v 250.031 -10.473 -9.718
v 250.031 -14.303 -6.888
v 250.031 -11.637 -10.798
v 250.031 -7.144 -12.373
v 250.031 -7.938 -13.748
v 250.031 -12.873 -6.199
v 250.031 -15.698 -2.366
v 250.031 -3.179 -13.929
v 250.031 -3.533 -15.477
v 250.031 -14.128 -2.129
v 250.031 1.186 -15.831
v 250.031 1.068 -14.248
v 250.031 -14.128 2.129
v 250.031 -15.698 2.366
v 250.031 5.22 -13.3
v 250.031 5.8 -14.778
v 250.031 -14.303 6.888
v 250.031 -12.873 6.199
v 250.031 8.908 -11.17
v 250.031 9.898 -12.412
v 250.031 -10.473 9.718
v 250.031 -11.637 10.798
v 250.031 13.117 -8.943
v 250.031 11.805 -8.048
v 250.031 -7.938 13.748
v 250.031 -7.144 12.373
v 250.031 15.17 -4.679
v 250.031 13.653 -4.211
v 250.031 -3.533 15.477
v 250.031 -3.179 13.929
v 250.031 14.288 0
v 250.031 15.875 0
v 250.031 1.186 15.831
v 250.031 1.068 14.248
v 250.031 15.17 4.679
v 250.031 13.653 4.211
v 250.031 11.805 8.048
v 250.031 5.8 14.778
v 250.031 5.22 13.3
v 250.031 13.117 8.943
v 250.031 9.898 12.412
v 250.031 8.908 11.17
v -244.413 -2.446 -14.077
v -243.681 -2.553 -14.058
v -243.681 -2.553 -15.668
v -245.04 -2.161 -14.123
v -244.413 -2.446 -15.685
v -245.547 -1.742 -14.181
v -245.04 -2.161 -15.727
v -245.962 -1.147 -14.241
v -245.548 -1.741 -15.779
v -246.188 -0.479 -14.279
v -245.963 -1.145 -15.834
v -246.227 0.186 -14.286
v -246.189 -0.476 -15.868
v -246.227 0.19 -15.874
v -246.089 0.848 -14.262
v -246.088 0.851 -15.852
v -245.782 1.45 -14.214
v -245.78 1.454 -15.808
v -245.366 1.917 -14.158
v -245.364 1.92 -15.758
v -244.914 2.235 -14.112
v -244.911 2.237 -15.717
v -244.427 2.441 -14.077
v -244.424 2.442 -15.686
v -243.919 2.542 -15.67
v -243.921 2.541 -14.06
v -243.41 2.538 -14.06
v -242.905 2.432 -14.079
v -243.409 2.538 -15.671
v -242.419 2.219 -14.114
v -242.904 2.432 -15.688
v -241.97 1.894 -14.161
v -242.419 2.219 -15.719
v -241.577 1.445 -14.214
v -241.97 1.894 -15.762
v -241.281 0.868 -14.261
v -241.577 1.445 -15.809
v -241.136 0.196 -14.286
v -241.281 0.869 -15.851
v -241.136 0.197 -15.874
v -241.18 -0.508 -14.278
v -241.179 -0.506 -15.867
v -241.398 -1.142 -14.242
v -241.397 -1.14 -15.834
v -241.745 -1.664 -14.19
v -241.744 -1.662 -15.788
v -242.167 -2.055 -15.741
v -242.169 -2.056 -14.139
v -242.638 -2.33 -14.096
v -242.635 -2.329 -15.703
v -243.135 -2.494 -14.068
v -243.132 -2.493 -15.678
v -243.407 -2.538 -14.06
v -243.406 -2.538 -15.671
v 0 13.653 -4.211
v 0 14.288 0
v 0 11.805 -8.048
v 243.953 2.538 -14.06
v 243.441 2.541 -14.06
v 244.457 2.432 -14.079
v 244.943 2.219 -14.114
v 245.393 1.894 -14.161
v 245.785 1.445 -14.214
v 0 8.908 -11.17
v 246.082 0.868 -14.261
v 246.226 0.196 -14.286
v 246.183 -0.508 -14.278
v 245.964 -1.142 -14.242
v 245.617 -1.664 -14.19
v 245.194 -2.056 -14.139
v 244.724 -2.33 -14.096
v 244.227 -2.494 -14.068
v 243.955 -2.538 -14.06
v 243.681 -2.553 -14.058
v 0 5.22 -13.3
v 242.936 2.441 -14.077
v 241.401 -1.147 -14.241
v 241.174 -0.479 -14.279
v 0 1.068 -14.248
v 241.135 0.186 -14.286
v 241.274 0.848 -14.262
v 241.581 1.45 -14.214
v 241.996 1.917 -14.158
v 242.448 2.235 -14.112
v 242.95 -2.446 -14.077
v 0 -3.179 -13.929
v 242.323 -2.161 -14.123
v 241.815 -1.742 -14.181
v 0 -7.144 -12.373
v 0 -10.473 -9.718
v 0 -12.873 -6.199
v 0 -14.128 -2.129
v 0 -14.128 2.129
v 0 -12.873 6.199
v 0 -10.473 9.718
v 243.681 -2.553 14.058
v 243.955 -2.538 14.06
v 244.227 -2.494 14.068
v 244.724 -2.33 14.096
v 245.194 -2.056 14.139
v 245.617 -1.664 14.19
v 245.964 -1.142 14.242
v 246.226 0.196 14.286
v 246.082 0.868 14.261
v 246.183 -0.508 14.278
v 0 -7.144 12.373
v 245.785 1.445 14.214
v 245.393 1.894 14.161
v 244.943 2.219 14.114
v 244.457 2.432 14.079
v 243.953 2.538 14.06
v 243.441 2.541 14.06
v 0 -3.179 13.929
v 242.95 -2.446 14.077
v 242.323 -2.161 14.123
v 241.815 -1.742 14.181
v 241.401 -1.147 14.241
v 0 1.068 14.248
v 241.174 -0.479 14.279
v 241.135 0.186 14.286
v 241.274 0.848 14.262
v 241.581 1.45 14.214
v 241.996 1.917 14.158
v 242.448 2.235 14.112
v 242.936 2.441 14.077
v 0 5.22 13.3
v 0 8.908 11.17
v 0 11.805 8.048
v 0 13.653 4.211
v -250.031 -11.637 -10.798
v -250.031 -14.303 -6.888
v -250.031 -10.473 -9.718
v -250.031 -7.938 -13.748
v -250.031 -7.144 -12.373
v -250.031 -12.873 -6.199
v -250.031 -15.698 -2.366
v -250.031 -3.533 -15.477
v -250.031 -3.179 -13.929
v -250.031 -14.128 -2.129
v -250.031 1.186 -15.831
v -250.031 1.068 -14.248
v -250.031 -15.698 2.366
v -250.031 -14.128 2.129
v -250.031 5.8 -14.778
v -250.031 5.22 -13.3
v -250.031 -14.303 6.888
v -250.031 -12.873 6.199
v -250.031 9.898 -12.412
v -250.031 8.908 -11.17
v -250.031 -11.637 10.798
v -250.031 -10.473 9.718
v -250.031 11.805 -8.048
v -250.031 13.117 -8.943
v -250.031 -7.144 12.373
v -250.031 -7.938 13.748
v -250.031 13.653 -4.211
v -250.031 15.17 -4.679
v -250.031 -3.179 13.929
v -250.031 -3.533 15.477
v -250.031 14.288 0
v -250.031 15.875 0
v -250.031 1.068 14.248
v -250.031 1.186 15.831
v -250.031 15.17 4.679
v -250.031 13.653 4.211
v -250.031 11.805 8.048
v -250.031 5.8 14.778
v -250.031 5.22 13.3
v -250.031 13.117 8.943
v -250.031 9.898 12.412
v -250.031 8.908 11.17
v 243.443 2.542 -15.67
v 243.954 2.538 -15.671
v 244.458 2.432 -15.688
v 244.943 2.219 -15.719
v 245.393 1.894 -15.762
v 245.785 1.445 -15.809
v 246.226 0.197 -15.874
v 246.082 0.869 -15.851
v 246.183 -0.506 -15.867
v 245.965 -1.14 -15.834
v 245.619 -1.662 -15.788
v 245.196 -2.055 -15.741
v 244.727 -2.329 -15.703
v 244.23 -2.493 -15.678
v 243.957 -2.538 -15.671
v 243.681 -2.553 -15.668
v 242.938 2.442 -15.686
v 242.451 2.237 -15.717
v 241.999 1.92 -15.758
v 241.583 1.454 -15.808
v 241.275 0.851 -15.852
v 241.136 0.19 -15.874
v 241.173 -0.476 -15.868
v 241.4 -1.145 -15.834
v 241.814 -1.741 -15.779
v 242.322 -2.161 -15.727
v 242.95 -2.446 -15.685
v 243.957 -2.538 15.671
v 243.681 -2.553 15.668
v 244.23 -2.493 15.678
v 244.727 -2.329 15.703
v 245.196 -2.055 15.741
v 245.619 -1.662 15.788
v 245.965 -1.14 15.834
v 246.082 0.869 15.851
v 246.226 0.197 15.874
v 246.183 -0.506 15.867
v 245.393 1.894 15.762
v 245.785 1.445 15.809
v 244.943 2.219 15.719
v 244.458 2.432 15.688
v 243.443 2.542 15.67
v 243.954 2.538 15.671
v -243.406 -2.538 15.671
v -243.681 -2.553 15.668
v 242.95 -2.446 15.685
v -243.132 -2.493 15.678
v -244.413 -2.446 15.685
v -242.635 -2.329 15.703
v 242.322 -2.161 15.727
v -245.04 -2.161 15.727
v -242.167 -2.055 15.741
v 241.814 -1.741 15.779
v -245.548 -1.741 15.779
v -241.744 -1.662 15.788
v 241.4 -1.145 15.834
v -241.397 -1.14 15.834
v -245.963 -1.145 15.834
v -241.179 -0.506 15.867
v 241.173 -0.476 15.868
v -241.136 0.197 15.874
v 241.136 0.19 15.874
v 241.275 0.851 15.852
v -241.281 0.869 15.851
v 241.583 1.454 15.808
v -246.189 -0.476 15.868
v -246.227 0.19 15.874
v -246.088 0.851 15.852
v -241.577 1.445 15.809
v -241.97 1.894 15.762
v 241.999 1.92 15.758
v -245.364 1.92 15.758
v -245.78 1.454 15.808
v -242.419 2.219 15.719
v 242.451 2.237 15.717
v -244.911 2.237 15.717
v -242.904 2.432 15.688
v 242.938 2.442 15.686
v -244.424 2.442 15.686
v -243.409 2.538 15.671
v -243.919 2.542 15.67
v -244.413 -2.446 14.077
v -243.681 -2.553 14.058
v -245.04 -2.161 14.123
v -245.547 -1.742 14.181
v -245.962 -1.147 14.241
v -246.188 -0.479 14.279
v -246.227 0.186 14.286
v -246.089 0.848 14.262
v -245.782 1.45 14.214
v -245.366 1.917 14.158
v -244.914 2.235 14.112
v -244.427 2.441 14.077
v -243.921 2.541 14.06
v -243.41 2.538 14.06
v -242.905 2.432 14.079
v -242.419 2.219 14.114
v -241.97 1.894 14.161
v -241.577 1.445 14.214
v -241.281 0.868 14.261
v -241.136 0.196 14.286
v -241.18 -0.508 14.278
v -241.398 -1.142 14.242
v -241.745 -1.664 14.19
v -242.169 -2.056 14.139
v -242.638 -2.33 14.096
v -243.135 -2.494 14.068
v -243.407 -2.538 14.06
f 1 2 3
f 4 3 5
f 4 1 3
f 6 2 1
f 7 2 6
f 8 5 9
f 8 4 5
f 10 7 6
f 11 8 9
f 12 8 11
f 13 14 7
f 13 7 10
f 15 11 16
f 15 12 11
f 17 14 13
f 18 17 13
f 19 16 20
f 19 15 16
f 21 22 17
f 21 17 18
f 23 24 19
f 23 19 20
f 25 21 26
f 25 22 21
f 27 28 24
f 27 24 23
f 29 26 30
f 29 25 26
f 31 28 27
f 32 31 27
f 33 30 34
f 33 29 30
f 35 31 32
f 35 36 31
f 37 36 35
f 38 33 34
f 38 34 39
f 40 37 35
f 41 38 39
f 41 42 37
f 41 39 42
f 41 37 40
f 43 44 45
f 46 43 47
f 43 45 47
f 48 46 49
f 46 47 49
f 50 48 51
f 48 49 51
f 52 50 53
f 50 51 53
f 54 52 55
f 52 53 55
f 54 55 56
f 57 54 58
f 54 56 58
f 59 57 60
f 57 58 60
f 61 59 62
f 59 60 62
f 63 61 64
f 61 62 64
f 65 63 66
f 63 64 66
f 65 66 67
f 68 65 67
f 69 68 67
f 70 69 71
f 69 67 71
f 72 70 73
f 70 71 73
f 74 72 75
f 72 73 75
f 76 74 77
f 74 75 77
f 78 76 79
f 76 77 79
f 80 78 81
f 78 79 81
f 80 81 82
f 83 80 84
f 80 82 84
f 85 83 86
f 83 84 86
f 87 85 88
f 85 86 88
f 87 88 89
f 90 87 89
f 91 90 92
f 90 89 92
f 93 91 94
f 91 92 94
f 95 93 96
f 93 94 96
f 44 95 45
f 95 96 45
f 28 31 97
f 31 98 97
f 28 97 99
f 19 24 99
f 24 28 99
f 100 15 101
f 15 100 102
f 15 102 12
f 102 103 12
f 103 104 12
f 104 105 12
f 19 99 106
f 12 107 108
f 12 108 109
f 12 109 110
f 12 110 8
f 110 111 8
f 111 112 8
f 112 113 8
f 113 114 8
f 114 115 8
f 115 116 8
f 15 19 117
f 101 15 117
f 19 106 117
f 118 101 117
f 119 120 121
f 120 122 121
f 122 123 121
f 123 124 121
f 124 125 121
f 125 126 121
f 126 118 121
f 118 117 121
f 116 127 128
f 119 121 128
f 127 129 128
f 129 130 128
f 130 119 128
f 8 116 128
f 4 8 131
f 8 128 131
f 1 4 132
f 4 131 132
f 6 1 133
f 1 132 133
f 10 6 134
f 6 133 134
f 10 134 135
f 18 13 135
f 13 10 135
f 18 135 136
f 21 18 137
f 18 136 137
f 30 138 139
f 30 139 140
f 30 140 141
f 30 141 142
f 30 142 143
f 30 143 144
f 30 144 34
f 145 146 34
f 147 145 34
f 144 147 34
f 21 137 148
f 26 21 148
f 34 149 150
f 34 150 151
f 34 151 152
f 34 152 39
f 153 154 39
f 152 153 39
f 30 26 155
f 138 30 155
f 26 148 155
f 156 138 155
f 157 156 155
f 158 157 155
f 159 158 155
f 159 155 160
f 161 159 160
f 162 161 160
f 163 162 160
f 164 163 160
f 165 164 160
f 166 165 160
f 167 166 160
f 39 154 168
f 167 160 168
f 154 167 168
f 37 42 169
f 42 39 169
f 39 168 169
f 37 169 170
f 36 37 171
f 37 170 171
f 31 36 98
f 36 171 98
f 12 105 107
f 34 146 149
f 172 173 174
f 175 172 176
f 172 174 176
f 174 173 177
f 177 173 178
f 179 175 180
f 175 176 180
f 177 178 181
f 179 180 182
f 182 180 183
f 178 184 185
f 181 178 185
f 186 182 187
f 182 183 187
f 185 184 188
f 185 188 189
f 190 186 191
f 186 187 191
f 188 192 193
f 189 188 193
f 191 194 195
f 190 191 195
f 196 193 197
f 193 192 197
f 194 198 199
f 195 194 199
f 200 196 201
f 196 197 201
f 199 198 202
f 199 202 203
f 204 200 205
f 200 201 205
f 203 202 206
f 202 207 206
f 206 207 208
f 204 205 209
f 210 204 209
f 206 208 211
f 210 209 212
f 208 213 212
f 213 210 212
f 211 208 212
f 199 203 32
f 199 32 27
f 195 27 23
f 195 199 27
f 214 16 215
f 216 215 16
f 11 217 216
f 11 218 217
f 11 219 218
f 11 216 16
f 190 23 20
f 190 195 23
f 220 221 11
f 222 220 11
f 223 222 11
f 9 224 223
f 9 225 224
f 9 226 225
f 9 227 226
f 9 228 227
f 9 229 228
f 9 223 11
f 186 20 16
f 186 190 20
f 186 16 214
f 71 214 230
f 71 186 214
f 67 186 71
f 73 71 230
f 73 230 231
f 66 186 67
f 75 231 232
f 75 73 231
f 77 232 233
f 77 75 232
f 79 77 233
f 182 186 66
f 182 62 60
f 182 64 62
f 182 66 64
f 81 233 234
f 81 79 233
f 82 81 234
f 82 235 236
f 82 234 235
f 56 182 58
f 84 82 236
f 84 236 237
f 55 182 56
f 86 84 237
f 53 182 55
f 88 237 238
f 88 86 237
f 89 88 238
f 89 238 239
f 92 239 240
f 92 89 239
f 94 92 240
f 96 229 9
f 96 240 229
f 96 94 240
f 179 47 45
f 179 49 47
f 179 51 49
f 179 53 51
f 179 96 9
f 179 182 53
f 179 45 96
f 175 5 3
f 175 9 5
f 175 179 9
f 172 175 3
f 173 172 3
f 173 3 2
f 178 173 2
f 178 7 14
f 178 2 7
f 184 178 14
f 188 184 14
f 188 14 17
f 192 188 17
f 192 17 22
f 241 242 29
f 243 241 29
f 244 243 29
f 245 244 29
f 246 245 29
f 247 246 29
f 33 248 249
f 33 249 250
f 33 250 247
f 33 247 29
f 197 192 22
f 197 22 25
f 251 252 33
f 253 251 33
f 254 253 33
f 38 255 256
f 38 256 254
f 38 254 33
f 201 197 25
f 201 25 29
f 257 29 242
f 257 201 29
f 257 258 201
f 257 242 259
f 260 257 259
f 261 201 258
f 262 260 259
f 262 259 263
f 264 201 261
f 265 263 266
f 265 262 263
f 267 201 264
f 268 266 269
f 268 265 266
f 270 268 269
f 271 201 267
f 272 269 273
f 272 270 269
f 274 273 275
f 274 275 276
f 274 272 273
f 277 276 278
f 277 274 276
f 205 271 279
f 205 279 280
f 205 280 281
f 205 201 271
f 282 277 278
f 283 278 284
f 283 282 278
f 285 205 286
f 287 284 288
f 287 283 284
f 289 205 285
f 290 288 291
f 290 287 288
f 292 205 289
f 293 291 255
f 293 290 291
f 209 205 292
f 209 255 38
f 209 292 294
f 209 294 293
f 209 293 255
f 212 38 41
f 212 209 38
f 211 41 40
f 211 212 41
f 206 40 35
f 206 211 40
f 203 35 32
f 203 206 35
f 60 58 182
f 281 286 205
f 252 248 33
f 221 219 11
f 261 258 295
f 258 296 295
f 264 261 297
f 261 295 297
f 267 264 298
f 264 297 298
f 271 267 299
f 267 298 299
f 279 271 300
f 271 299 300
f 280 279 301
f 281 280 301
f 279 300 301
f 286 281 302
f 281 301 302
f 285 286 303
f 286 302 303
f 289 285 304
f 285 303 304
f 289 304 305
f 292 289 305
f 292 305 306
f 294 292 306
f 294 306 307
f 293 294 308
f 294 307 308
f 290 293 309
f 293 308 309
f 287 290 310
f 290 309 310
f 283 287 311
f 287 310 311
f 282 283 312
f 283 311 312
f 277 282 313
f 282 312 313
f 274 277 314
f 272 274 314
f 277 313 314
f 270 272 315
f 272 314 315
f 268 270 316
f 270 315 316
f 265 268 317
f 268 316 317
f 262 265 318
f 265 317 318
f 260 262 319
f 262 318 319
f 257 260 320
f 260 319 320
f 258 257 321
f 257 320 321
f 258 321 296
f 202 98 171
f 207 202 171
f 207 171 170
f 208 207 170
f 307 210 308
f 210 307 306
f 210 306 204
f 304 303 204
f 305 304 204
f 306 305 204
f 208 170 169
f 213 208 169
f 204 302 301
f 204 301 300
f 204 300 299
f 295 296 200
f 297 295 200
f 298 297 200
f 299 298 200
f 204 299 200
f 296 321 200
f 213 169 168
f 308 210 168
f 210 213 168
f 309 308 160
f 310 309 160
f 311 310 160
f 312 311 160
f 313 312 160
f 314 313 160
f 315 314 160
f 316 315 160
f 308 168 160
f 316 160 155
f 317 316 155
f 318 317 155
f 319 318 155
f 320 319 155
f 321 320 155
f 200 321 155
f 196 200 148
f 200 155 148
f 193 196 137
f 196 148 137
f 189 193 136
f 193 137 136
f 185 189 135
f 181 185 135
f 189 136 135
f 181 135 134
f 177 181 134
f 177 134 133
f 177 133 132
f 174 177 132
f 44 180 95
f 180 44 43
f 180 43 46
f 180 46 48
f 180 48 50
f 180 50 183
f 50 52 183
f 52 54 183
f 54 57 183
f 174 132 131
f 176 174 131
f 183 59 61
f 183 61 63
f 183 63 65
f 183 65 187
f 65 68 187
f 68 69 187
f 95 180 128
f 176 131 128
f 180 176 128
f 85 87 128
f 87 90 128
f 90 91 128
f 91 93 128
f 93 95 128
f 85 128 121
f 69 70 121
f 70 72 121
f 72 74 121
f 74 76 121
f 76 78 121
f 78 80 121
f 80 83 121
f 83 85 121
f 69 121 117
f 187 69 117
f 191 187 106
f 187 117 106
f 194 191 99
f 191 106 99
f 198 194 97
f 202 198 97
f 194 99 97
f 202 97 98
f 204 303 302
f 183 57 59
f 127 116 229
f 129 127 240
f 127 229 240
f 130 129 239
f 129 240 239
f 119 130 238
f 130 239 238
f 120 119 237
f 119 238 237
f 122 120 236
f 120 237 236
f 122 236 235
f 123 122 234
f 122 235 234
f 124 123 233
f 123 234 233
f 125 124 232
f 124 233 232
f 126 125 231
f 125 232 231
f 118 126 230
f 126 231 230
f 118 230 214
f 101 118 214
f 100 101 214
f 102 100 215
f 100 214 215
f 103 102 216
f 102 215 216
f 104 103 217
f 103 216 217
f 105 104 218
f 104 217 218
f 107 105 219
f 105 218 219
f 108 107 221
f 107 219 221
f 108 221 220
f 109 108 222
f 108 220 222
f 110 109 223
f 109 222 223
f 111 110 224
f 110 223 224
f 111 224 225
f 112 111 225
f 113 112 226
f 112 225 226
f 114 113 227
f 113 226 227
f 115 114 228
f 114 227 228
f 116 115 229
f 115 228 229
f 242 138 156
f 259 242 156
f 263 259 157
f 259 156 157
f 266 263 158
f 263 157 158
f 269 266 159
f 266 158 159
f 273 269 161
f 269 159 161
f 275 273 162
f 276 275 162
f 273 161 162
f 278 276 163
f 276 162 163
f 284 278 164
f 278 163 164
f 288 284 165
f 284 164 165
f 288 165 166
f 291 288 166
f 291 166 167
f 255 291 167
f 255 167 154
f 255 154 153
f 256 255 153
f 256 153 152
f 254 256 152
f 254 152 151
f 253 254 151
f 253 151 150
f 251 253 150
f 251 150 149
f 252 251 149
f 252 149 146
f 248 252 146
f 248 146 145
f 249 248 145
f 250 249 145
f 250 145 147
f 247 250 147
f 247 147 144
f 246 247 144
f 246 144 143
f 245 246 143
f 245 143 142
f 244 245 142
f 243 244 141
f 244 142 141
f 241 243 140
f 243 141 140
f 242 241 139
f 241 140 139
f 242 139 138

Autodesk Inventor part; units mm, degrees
ref_plane "YZ Plane" through (0, 0, 0) normal (1, 0, 0) x (0, 1, 0)
ref_plane "XZ Plane" through (0, 0, 0) normal (0, 1, 0) x (-1, 0, 0)
sketch "Sketch1" plane through (0, 0, 0) normal (1, 0, 0) x (0, 1, 0)
  circle A0 centre (0, 0) radius 15.875
  circle A1 centre (0, 0) radius 14.2875
  dimension "d0" = 31.75
  dimension "d2" = 1.5875
extrude "Extrusion1" add sketch "Sketch1" along normal mid plane 500.0625
ref_plane "Work Plane1" through (0, 0, 17.4625) normal (0, 0, 1) x (1, 0, 0)
sketch "Sketch3" plane through (0, 0, 17.4625) normal (0, 0, 1) x (1, 0, 0)
  line L0 (-250.0312, 15.875) -> (-250.0312, -15.875) projected
  line L1 (250.0312, -15.875) -> (250.0312, 15.875) projected
  point P0 (0, 0)
  point P1 (-243.6812, 0)
  point P2 (-250.0312, 0)
  point P3 (243.6812, 0)
  point P4 (250.0312, 0)
  dimension "d15" = 6.35
  dimension "d16" = 6.35
hole "Hole2" at (-243.6812, 0, 17.4625) at (243.6812, 0, 17.4625) direction (0, 0, -1) diameter 5.1054 end through all clearance for "Flat Head Machine Screw (82)" size "#10" standard "Ansi Unified Screw Threads"
properties part number "GI - 003" material "Polycarbonate, Smoke"
